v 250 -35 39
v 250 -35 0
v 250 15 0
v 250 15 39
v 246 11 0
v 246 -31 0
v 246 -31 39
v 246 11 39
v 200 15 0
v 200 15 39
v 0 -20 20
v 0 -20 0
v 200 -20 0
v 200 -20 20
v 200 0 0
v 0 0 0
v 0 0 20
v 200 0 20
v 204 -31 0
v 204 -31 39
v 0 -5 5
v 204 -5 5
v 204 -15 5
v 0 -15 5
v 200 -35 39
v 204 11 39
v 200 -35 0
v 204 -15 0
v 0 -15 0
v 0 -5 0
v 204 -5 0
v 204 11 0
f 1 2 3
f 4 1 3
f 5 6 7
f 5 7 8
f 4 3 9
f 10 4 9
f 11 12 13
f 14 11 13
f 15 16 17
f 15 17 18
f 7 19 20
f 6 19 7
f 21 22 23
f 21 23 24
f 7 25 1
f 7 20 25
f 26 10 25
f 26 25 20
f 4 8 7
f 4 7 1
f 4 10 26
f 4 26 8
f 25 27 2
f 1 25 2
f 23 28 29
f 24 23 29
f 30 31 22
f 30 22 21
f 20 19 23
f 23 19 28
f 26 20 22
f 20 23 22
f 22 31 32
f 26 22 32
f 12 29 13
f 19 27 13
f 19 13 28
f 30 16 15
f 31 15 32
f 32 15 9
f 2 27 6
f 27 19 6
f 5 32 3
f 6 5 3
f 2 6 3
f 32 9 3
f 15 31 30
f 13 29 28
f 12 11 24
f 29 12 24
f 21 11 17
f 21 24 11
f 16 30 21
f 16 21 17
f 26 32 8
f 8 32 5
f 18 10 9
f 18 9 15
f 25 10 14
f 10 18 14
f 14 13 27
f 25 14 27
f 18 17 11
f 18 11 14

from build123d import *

# Parameters (mm, degrees)
ESQUISSE1_W             = 200
ESQUISSE1_H             = 20
ESQUISSE1_W_2           = 42
ESQUISSE1_H_2           = 42
BOSS_EXTRU_1_DEPTH      = 39
ESQUISSE2_W             = 200
ESQUISSE2_H             = 20
ENL_V_MAT_EXTRU_1_DEPTH = 19
ESQUISSE3_W             = 204
ESQUISSE3_H             = 10
ENL_V_MAT_EXTRU_3_DEPTH = 5


with BuildPart() as part:
    # Esquisse1 → Boss.-Extru.1 (new body)
    with BuildSketch(Plane.XY):
        with Locations((100, -10)):
            Rectangle(ESQUISSE1_W, ESQUISSE1_H)
        Polygon((200, 15), (200, 0), (200, -20), (200, -35), (250, -35), (250, 15), align=None)
        with Locations((225, -10)):
            Rectangle(ESQUISSE1_W_2, ESQUISSE1_H_2, mode=Mode.SUBTRACT)
    extrude(amount=BOSS_EXTRU_1_DEPTH)

    # Esquisse2 → Enlèv. mat.-Extru.1 (cut)
    with BuildSketch(Plane.XY.offset(39)):
        with Locations((100, -10)):
            Rectangle(ESQUISSE2_W, ESQUISSE2_H)
    extrude(amount=-ENL_V_MAT_EXTRU_1_DEPTH, mode=Mode.SUBTRACT)

    # Esquisse3 → Enlèv. mat.-Extru.3 (cut)
    with BuildSketch(Plane(origin=(0, 0, 0), x_dir=(-1, 0, 0), z_dir=(0, 0, -1))):
        with Locations((-102, -10)):
            Rectangle(ESQUISSE3_W, ESQUISSE3_H)
    extrude(amount=-ENL_V_MAT_EXTRU_3_DEPTH, mode=Mode.SUBTRACT)


solid = part.part
